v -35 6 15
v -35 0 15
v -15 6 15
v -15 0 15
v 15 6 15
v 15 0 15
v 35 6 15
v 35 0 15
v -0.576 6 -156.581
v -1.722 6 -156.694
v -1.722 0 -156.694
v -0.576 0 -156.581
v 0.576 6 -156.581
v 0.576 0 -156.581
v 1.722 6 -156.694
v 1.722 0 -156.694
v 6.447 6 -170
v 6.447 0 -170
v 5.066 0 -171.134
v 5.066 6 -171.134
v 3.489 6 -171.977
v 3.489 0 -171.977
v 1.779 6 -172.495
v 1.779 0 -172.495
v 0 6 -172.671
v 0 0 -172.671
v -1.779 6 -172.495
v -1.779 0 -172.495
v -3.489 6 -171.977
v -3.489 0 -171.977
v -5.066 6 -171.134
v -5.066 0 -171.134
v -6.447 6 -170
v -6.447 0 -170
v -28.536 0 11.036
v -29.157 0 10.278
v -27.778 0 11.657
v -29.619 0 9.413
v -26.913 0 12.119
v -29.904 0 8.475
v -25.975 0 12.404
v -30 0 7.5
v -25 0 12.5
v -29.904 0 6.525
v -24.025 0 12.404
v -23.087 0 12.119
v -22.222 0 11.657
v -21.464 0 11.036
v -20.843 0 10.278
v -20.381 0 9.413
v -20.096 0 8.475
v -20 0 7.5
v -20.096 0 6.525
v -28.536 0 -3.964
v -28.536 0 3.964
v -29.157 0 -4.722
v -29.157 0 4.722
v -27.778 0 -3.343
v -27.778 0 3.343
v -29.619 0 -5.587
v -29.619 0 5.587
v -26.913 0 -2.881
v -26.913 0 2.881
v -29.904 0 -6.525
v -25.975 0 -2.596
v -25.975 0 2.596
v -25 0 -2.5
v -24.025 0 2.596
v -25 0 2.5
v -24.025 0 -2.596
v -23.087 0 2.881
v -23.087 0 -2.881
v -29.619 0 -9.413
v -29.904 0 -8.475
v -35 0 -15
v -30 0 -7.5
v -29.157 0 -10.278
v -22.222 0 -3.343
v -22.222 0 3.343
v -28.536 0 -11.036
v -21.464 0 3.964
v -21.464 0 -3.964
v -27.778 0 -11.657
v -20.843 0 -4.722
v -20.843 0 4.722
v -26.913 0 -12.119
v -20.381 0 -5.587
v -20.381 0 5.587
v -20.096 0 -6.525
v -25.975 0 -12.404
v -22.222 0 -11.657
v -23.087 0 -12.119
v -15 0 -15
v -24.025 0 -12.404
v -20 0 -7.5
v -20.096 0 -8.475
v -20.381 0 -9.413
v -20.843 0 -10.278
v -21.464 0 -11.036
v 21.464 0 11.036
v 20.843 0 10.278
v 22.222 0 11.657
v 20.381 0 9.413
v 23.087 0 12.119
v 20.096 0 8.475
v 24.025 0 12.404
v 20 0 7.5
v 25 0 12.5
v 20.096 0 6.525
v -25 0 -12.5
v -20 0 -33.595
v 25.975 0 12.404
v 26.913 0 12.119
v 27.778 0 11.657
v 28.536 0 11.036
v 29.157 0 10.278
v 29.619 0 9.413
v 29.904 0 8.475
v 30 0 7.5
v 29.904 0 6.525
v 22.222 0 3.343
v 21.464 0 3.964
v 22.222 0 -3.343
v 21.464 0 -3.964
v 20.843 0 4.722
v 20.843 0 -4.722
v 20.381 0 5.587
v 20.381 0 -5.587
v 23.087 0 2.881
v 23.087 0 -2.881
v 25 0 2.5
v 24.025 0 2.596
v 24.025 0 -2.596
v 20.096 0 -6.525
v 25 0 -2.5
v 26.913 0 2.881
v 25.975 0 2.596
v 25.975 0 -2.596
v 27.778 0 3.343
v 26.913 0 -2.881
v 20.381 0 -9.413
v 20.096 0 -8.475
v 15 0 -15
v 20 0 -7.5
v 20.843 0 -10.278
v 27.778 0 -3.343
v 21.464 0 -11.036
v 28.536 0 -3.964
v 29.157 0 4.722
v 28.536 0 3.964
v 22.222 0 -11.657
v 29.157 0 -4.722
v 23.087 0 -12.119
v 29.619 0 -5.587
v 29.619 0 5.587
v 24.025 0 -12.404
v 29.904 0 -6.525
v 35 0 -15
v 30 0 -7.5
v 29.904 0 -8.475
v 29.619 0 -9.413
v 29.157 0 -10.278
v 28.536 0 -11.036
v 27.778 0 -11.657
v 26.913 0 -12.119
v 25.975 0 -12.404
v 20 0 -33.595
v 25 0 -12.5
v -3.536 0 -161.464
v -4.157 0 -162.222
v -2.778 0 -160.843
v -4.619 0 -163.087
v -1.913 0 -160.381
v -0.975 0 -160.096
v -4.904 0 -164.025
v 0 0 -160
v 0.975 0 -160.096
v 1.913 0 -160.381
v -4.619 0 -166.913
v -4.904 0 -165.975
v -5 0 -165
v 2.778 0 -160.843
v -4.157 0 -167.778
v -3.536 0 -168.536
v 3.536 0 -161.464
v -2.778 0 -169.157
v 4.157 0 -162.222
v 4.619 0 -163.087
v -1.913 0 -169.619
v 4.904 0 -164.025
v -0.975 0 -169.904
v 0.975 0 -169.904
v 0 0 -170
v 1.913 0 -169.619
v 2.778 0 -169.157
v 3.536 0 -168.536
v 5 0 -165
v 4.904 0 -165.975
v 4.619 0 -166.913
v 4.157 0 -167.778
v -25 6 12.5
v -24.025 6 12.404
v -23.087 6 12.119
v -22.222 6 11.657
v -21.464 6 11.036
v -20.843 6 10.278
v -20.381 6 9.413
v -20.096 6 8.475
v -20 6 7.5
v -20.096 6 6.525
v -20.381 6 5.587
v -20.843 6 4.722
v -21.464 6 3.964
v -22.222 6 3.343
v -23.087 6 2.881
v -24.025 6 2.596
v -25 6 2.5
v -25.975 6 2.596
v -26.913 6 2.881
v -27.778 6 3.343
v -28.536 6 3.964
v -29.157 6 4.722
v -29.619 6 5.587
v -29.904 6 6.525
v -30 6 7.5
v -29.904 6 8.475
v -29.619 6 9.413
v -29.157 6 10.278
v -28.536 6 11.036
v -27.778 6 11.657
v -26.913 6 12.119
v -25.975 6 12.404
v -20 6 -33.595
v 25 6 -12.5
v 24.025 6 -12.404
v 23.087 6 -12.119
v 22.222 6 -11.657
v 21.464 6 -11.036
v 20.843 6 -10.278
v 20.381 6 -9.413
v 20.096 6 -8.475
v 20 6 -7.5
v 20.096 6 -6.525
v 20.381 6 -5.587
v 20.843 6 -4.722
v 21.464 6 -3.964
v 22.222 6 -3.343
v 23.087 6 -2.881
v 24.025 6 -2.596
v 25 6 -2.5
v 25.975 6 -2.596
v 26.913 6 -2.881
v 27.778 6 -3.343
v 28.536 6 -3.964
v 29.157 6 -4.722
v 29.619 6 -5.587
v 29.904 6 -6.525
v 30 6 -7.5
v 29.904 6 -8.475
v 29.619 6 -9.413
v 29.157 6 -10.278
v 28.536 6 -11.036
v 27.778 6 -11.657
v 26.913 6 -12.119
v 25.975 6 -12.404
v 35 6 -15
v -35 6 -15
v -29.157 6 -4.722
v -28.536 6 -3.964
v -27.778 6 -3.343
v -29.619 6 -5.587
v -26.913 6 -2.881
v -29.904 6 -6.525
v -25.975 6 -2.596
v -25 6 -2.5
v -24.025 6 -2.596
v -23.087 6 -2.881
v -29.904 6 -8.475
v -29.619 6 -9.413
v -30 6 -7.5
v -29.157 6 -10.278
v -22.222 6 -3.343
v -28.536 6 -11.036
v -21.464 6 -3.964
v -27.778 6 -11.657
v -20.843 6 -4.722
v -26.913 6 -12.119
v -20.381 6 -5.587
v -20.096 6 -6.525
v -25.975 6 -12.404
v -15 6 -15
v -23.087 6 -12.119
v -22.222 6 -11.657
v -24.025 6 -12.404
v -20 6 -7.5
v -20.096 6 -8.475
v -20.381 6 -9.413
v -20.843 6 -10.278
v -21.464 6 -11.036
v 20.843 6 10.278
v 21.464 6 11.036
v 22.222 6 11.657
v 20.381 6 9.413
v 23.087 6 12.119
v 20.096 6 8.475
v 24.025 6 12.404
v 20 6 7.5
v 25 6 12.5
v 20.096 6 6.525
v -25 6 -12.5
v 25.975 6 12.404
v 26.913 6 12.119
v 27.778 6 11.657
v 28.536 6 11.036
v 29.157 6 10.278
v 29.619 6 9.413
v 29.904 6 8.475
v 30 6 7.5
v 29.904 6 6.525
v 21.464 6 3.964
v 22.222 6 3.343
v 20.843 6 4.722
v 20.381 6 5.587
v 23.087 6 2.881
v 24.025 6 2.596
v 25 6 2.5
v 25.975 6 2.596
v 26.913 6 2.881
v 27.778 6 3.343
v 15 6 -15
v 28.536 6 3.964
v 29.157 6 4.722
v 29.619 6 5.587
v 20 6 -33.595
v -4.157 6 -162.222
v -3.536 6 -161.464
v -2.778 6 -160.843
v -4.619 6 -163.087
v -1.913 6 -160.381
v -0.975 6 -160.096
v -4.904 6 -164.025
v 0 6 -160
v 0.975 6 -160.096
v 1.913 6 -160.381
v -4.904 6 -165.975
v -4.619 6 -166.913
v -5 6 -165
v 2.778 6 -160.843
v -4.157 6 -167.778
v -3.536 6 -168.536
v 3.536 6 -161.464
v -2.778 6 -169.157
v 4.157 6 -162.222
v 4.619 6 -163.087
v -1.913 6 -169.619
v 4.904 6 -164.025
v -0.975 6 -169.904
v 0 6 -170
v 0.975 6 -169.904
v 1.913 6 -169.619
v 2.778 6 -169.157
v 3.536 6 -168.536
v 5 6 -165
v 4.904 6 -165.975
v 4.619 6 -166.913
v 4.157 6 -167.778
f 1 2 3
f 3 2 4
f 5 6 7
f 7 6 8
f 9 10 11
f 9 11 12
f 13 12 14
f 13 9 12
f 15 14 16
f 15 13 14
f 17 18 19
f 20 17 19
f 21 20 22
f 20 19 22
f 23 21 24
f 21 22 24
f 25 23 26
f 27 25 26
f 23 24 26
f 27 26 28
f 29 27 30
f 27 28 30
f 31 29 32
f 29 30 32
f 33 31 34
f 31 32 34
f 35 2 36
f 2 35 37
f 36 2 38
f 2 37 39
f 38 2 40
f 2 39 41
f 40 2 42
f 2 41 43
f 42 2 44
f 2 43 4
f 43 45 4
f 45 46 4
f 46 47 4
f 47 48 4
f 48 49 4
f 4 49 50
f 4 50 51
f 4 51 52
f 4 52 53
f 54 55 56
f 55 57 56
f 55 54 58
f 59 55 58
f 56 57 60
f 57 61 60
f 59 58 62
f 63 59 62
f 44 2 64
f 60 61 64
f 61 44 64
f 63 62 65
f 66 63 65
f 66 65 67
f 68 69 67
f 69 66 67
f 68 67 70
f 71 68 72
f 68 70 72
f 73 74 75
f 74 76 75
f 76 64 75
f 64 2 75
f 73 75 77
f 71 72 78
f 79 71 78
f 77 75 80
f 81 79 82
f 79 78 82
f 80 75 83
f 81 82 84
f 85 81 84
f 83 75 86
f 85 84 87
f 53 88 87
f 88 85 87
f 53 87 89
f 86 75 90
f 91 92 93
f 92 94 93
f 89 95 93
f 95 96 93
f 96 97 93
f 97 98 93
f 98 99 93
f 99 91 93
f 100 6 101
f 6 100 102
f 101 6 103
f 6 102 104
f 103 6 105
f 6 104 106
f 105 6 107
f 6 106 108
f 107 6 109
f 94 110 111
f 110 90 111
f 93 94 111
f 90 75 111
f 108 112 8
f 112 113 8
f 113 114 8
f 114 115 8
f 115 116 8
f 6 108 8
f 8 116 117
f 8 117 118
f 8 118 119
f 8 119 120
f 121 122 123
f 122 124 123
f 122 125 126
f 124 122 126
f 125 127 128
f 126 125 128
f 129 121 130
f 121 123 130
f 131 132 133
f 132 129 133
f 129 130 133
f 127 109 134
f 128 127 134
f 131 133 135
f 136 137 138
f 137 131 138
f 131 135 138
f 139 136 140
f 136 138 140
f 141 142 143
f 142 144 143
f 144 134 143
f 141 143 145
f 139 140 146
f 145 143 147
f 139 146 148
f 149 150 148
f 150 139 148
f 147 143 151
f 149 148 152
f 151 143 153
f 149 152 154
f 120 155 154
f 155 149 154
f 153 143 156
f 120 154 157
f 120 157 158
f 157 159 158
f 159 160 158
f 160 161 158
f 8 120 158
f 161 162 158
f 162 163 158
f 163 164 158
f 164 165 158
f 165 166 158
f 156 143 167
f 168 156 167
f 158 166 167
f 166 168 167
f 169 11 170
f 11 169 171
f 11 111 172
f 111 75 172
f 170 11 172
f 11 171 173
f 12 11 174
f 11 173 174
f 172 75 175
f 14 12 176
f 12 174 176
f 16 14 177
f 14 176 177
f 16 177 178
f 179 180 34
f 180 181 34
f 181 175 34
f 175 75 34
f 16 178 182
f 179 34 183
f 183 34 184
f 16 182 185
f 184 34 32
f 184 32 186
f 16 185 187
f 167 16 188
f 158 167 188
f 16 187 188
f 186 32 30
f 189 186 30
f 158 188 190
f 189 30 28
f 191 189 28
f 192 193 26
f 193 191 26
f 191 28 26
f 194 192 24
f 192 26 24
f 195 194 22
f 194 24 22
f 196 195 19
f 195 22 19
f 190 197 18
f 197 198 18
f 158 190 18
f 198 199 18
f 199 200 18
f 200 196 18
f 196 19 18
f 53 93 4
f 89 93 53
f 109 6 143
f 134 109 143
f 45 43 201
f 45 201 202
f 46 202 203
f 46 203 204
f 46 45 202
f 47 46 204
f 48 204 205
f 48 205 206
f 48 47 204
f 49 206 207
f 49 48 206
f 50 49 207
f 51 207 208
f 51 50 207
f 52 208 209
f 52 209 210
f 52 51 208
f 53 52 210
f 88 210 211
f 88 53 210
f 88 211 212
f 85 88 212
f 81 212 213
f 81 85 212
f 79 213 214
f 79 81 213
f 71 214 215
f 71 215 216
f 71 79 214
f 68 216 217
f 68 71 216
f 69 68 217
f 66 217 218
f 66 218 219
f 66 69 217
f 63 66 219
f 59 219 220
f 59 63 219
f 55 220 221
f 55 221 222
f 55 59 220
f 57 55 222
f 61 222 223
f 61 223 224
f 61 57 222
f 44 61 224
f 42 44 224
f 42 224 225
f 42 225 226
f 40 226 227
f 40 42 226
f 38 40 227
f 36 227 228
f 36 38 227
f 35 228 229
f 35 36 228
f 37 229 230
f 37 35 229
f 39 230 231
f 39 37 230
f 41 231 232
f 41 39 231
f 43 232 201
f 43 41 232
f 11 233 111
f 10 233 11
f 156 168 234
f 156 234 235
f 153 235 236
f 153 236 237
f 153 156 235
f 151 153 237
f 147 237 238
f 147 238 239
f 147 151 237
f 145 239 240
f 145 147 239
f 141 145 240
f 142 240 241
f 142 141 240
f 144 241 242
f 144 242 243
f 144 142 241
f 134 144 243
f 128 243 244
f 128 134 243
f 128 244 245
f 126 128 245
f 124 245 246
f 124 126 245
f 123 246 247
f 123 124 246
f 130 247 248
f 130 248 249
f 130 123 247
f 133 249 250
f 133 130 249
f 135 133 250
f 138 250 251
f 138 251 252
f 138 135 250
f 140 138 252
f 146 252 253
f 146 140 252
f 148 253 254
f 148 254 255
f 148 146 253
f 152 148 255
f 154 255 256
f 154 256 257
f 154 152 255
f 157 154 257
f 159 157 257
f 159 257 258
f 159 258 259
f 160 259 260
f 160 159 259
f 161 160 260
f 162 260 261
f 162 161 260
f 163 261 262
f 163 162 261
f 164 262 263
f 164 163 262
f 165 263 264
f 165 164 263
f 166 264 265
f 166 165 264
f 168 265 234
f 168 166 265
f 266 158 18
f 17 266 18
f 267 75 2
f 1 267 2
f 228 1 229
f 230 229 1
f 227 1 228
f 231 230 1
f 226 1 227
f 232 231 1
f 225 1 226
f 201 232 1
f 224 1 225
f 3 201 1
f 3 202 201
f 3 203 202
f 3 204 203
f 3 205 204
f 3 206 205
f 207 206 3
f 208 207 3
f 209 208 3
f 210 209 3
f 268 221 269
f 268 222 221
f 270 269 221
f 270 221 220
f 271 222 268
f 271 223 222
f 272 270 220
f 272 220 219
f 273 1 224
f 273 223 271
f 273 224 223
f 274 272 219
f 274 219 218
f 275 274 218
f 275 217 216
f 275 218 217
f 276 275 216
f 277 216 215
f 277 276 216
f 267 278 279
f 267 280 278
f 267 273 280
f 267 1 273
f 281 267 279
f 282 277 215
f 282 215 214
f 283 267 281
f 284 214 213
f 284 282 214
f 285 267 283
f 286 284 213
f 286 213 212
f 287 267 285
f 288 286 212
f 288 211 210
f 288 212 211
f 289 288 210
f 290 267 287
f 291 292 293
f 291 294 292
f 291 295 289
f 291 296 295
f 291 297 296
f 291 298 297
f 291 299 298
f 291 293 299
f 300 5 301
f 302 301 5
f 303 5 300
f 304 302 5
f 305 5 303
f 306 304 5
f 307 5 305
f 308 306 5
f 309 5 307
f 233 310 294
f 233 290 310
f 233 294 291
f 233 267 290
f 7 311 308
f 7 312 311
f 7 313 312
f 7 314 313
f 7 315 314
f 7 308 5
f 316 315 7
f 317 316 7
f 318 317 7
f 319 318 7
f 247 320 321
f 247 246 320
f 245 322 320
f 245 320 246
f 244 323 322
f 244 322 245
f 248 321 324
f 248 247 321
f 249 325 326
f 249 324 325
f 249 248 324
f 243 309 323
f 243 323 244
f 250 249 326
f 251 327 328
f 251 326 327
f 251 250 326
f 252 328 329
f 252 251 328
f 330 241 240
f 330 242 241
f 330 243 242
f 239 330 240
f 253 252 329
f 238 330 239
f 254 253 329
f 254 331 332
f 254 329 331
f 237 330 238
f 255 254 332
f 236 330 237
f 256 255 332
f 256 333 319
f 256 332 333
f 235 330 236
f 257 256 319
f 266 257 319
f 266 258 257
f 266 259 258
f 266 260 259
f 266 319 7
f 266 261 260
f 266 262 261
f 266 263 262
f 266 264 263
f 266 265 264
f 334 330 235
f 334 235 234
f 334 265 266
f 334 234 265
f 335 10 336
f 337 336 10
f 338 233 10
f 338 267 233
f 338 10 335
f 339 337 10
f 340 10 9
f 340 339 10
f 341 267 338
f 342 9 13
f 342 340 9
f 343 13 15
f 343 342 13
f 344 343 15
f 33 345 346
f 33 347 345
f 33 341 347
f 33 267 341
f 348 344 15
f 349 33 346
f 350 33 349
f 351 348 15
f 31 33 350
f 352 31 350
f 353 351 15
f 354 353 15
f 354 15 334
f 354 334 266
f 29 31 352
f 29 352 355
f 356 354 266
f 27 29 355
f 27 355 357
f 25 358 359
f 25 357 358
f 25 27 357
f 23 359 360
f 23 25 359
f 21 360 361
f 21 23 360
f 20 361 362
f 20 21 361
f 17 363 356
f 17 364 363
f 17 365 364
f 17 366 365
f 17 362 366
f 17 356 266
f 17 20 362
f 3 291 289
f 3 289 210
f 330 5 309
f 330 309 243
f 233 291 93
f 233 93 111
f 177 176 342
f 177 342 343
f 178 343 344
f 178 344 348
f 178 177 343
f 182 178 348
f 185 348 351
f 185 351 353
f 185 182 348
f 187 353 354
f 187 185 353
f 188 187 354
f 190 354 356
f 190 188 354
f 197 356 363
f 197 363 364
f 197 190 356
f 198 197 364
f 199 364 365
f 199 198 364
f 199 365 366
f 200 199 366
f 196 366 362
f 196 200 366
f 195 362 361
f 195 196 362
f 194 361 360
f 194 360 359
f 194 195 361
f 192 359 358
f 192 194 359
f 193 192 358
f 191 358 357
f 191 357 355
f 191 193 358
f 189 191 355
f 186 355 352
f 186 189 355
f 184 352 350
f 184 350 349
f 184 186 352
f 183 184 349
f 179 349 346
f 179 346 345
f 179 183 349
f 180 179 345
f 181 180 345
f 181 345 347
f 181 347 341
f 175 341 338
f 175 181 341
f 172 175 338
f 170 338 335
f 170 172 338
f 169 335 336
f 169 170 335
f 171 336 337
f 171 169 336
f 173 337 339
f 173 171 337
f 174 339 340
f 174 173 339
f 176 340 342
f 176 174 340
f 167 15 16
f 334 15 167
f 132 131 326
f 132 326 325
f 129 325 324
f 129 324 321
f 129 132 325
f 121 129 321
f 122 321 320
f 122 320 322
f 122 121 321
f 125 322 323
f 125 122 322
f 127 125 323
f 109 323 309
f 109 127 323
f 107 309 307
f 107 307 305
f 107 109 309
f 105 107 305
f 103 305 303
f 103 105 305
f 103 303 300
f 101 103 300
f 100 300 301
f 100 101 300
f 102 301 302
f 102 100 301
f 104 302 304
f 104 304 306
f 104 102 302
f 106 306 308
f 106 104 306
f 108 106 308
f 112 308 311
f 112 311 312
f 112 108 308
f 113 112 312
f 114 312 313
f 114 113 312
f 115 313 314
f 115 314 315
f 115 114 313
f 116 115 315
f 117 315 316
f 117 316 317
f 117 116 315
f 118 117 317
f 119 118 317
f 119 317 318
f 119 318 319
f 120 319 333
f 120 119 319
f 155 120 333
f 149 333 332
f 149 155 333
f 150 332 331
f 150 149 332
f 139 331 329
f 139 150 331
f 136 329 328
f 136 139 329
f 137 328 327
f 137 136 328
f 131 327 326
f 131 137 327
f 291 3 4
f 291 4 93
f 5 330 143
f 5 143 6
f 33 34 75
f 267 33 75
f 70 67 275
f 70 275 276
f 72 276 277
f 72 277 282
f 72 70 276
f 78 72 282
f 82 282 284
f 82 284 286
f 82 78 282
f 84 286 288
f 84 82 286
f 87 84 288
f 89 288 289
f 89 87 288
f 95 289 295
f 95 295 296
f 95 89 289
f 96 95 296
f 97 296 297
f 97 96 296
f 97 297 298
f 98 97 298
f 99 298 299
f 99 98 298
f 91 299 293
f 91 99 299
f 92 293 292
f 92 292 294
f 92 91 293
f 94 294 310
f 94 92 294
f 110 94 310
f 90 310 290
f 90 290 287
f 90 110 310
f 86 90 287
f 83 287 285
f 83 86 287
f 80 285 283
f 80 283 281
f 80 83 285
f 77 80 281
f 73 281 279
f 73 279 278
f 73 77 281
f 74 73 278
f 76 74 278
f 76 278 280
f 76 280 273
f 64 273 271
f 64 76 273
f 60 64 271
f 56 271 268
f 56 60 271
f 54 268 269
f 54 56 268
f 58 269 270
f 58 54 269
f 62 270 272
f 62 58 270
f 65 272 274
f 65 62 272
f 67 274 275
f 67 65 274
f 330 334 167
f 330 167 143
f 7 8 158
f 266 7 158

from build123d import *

# Parameters (mm, degrees)
SKETCH1_R           = 5
BOSS_EXTRUDE1_DEPTH = 6
CUT_EXTRUDE1_DEPTH  = 10


with BuildPart() as part:
    # Sketch1 → Boss-Extrude1 (new body)
    with BuildSketch(Plane(origin=(0, 0, 0), x_dir=(1, 0, 0), z_dir=(0, 1, 0))):
        with BuildLine():
            Line((-35, -15), (35, -15))
            Line((35, -15), (35, 15))
            Line((35, 15), (6.447368421, 170))
            ThreePointArc((6.447368421, 170), (0, 172.670587442), (-6.447368421, 170))
            Line((-6.447368421, 170), (-35, 15))
            Line((-35, 15), (-35, -15))
        make_face()
        with Locations(Location((0, 165, 0), (0, 0, 270))):
            Circle(SKETCH1_R, mode=Mode.SUBTRACT)
        with Locations(Location((-25, 7.5, 0), (0, 0, 270))):
            Circle(SKETCH1_R, mode=Mode.SUBTRACT)
        with Locations(Location((-25, -7.5, 0), (0, 0, 270))):
            Circle(SKETCH1_R, mode=Mode.SUBTRACT)
        with Locations(Location((25, 7.5, 0), (0, 0, 90))):
            Circle(SKETCH1_R, mode=Mode.SUBTRACT)
        with Locations(Location((25, -7.5, 0), (0, 0, 90))):
            Circle(SKETCH1_R, mode=Mode.SUBTRACT)
    extrude(amount=BOSS_EXTRUDE1_DEPTH)

    # Sketch6 → Cut-Extrude1 (cut)
    with BuildSketch(Plane(origin=(0, 6, 0), x_dir=(1, 0, 0), z_dir=(0, 1, 0))):
        with BuildLine():
            Line((-15, -15), (-15, 15))
            Line((-15, 15), (-20, 33.595074374))
            Line((-20, 33.595074374), (-1.721816463, 156.693521977))
            ThreePointArc((-1.721816463, 156.693521977), (0, 156.566387575), (1.721816463, 156.693521977))
            Line((1.721816463, 156.693521977), (20, 33.595074374))
            Line((20, 33.595074374), (15, 15))
            Line((15, 15), (15, -15))
            Line((15, -15), (-15, -15))
        make_face()
    extrude(amount=-CUT_EXTRUDE1_DEPTH, mode=Mode.SUBTRACT)


solid = part.part
